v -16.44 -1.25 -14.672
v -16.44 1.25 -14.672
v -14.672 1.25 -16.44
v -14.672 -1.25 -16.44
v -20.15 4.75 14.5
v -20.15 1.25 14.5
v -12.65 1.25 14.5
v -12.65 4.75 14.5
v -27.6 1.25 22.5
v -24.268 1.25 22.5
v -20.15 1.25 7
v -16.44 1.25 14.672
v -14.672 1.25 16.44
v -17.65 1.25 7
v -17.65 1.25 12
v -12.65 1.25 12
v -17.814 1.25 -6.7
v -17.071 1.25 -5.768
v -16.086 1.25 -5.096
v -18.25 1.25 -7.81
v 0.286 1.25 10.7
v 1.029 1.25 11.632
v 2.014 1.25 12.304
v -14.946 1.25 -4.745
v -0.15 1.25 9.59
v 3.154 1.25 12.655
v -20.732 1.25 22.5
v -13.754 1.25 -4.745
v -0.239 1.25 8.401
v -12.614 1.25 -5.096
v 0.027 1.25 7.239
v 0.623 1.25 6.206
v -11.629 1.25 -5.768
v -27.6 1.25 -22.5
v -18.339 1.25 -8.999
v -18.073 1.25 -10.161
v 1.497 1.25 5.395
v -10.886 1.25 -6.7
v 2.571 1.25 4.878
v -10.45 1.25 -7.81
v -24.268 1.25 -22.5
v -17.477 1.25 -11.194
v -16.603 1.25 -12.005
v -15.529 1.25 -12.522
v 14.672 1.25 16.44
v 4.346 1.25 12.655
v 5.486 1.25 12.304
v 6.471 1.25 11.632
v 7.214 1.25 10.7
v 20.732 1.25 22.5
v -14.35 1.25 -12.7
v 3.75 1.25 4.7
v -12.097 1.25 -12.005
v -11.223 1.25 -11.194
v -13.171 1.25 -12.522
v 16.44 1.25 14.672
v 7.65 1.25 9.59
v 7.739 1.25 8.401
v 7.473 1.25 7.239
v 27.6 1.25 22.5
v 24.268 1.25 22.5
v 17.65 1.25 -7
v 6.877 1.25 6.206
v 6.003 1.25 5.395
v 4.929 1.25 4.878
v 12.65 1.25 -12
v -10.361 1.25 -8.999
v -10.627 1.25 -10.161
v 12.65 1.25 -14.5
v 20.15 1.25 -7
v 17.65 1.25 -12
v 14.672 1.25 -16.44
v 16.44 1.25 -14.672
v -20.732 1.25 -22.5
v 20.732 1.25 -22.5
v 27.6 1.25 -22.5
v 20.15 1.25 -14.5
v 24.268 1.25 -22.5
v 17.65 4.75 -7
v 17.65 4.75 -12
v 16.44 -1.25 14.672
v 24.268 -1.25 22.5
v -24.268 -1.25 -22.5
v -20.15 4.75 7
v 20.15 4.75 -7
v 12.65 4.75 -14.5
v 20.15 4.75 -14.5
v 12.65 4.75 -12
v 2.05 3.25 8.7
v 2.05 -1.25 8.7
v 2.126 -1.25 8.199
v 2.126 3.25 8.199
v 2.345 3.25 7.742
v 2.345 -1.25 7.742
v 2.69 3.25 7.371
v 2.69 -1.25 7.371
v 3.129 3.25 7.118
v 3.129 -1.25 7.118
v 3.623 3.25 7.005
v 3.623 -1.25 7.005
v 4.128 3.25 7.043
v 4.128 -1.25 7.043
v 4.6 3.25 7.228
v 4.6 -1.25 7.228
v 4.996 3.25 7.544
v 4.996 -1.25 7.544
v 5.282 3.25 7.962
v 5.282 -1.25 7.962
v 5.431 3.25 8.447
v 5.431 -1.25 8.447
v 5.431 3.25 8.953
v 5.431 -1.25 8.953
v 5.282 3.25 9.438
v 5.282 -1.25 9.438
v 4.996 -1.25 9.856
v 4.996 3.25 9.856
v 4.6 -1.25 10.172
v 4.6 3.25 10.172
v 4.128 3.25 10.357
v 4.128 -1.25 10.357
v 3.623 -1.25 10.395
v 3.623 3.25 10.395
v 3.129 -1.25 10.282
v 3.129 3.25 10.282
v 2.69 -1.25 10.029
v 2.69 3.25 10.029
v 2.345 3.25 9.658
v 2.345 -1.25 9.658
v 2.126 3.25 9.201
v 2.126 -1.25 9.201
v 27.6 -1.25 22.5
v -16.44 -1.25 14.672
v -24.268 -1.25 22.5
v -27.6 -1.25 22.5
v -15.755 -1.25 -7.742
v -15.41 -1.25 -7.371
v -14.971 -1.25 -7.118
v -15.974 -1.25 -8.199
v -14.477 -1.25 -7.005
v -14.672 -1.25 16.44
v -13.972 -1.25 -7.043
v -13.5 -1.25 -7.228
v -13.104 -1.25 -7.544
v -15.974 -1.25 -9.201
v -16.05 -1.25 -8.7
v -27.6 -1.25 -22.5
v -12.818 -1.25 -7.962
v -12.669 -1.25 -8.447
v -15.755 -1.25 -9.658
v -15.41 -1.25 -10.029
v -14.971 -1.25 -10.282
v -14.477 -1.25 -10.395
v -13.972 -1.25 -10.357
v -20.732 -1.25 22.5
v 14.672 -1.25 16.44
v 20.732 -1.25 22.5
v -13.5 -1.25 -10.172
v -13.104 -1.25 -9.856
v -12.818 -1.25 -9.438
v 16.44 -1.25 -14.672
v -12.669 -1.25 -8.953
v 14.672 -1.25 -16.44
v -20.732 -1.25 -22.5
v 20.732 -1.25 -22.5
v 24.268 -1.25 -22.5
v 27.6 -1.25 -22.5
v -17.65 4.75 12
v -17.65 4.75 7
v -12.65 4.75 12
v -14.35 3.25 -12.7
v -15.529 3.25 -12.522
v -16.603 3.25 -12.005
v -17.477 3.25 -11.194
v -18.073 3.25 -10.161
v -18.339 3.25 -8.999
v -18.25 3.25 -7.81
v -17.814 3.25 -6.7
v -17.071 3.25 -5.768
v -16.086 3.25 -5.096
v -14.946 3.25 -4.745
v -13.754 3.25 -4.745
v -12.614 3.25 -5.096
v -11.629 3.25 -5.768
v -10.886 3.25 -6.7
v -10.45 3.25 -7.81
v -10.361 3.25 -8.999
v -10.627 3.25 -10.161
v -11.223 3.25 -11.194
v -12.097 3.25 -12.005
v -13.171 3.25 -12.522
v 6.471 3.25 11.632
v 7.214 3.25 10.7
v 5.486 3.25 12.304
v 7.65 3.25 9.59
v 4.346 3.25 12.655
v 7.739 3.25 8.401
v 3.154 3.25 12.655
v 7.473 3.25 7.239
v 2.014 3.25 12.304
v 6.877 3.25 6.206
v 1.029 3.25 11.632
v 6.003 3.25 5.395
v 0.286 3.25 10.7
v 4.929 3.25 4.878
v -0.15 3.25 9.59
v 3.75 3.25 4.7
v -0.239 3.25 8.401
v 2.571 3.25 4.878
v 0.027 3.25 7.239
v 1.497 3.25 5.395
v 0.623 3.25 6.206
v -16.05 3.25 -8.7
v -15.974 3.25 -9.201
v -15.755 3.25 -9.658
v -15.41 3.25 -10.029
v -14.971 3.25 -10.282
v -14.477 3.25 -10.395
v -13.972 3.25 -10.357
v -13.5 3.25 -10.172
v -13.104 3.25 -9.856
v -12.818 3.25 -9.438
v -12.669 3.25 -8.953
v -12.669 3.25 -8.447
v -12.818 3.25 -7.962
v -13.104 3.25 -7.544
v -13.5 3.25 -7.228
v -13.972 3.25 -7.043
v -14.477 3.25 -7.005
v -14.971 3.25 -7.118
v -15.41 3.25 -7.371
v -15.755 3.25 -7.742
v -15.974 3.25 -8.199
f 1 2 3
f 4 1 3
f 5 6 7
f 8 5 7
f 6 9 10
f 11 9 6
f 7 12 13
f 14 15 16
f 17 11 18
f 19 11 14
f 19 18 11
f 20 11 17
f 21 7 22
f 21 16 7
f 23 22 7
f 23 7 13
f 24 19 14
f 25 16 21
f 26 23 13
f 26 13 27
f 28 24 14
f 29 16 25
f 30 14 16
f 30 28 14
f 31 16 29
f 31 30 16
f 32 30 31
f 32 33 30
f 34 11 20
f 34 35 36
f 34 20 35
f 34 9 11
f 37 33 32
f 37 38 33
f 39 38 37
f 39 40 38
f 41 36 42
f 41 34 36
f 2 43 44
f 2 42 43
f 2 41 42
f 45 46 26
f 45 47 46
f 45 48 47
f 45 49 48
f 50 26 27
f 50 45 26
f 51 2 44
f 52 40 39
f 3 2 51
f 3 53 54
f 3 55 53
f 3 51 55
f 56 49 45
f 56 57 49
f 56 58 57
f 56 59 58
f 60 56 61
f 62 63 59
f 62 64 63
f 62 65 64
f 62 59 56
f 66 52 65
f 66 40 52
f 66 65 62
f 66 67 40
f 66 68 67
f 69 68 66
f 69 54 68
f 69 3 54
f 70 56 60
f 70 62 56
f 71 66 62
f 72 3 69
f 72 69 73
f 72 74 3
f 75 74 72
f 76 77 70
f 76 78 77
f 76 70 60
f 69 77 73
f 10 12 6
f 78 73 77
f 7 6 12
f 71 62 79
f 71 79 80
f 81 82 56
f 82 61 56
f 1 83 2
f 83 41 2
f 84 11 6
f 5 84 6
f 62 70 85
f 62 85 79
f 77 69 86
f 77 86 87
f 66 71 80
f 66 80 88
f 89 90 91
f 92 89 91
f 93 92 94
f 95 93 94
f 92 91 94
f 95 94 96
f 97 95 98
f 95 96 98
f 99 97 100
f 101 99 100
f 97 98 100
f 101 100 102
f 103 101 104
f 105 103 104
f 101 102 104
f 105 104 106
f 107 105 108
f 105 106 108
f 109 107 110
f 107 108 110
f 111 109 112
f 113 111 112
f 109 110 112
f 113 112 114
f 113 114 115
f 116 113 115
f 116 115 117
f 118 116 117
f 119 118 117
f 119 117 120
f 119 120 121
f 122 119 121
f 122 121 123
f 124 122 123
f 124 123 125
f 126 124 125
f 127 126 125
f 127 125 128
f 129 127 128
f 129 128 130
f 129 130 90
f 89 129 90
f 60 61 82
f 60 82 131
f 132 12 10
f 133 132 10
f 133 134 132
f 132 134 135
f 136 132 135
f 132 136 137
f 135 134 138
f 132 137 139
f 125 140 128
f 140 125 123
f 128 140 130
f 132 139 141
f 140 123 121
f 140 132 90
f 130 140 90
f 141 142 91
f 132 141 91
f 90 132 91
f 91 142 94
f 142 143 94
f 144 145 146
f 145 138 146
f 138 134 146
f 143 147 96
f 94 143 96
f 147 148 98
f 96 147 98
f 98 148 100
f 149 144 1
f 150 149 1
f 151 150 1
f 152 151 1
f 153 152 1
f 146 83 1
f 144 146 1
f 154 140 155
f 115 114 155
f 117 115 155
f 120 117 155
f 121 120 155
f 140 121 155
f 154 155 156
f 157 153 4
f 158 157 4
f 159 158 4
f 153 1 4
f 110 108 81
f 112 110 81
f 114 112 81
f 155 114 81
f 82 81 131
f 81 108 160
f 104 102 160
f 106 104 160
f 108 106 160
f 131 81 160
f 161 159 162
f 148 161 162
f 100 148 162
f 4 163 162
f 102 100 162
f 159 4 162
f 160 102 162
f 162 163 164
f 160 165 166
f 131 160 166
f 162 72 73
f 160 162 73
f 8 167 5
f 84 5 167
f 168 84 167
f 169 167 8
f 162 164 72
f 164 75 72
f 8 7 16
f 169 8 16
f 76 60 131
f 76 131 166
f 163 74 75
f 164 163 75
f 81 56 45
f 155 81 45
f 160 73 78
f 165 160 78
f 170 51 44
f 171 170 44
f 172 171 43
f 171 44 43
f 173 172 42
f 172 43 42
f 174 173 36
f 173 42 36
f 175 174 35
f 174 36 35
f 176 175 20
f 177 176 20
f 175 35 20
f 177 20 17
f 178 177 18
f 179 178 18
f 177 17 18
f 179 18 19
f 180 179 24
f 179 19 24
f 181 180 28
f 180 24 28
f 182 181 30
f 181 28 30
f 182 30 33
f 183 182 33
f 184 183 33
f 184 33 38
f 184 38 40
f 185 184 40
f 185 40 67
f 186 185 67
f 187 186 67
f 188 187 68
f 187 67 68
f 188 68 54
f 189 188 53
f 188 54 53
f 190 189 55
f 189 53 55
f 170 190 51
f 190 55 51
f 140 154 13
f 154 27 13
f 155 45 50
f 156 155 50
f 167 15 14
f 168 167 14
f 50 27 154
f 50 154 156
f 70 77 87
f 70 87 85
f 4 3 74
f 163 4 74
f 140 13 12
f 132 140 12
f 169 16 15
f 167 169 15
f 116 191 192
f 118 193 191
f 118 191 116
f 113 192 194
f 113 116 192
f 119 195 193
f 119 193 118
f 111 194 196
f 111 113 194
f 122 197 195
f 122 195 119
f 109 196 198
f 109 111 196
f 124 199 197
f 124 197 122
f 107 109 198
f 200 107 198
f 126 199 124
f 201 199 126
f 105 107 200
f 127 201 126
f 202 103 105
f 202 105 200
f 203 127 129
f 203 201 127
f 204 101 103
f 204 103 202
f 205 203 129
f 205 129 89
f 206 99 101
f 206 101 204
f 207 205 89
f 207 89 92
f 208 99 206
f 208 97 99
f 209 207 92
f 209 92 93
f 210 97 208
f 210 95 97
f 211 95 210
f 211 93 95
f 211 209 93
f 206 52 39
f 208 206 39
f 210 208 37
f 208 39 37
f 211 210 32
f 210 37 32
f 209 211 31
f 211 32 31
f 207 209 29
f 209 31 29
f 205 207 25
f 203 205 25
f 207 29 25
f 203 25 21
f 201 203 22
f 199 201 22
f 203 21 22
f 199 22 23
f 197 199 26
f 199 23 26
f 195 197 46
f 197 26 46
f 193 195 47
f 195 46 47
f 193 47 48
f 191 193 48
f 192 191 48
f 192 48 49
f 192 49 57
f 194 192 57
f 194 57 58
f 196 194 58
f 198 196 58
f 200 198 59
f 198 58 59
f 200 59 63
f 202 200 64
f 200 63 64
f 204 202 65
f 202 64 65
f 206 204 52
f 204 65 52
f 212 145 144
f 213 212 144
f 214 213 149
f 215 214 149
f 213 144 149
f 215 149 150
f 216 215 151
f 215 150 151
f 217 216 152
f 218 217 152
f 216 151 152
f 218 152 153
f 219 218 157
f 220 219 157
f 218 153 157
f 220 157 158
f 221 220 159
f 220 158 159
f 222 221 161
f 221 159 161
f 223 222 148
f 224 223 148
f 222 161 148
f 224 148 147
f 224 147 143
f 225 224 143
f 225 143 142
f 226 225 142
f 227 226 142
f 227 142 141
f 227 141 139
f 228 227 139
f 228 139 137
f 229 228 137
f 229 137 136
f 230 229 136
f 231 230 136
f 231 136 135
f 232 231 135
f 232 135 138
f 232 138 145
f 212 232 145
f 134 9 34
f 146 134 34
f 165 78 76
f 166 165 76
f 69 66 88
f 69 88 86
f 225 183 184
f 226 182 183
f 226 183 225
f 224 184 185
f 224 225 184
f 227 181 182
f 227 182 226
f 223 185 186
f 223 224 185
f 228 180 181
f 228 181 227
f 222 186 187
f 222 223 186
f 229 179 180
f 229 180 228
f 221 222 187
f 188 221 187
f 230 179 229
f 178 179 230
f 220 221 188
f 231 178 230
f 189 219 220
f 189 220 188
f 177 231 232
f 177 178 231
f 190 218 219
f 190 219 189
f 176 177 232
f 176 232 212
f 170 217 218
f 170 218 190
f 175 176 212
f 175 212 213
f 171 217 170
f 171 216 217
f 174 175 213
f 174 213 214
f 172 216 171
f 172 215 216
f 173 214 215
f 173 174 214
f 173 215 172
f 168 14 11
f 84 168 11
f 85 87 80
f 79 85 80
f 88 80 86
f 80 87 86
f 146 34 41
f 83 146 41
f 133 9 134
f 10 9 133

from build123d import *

# Parameters (mm, degrees)
SKETCH3_W            = 55.2
SKETCH3_H            = 45
BOSS_EXTRUDE1_DEPTH  = 1.25
SKETCH4_R            = 4
BOSS_EXTRUDE2_DEPTH  = 2
M3_CLEARANCE_HOLE1_D = 3.4
BOSS_EXTRUDE3_DEPTH  = 3.5
CUT_EXTRUDE1_DEPTH   = 36.780721066
CIRPATTERN1_COUNT    = 4


with BuildPart() as part:
    # Sketch3 → Boss-Extrude1 (new, symmetric)
    with BuildSketch(Plane(origin=(0, 0, 0), x_dir=(1, 0, 0), z_dir=(0, 1, 0))):
        Rectangle(SKETCH3_W, SKETCH3_H)
    extrude(amount=BOSS_EXTRUDE1_DEPTH, both=True)

    # Sketch4 → Boss-Extrude2 (add)
    with BuildSketch(Plane(origin=(0, 1.25, 0), x_dir=(1, 0, 0), z_dir=(0, 1, 0))):
        with Locations((-14.35, 8.7)):
            Circle(SKETCH4_R)
        with Locations((3.75, -8.7)):
            Circle(SKETCH4_R)
    extrude(amount=BOSS_EXTRUDE2_DEPTH)

    # M3 Clearance Hole1 (through all)
    with Locations(Plane(origin=(0, 3.25, 0), x_dir=(1, 0, 0), z_dir=(0, 1, 0))):
        with Locations((-14.35, 8.7), (3.75, -8.7)):
            Hole(M3_CLEARANCE_HOLE1_D / 2)

    # Sketch7 → Boss-Extrude3 (add)
    with BuildSketch(Plane(origin=(0, 1.25, 0), x_dir=(1, 0, 0), z_dir=(0, 1, 0))):
        Polygon((-17.65, -12), (-17.65, -7), (-20.15, -7), (-20.15, -14.5), (-12.65, -14.5), (-12.65, -12), align=None)
        Polygon((17.65, 12), (12.65, 12), (12.65, 14.5), (20.15, 14.5), (20.15, 7), (17.65, 7), align=None)
    extrude(amount=BOSS_EXTRUDE3_DEPTH)

    # Sketch8 → Cut-Extrude1 (cut, symmetric)
    with BuildSketch(Plane(origin=(0, 1.25, 0), x_dir=(1, 0, 0), z_dir=(0, 1, 0))):
        Polygon((-30.32753429, 28.559767337), (-16.440232663, 14.67246571), (-14.67246571, 16.440232663), (-28.559767337, 30.32753429), align=None)
    cut_extrude1 = extrude(amount=CUT_EXTRUDE1_DEPTH, both=True, mode=Mode.SUBTRACT)

    # CirPattern1: Cut-Extrude1 ×4 about axis
    cirpattern1_axis = Axis((0, 50, 0), (0, -1, 0))
    for i in range(1, CIRPATTERN1_COUNT):
        add(cut_extrude1.rotate(cirpattern1_axis, i * 360 / CIRPATTERN1_COUNT), mode=Mode.SUBTRACT)


solid = part.part
